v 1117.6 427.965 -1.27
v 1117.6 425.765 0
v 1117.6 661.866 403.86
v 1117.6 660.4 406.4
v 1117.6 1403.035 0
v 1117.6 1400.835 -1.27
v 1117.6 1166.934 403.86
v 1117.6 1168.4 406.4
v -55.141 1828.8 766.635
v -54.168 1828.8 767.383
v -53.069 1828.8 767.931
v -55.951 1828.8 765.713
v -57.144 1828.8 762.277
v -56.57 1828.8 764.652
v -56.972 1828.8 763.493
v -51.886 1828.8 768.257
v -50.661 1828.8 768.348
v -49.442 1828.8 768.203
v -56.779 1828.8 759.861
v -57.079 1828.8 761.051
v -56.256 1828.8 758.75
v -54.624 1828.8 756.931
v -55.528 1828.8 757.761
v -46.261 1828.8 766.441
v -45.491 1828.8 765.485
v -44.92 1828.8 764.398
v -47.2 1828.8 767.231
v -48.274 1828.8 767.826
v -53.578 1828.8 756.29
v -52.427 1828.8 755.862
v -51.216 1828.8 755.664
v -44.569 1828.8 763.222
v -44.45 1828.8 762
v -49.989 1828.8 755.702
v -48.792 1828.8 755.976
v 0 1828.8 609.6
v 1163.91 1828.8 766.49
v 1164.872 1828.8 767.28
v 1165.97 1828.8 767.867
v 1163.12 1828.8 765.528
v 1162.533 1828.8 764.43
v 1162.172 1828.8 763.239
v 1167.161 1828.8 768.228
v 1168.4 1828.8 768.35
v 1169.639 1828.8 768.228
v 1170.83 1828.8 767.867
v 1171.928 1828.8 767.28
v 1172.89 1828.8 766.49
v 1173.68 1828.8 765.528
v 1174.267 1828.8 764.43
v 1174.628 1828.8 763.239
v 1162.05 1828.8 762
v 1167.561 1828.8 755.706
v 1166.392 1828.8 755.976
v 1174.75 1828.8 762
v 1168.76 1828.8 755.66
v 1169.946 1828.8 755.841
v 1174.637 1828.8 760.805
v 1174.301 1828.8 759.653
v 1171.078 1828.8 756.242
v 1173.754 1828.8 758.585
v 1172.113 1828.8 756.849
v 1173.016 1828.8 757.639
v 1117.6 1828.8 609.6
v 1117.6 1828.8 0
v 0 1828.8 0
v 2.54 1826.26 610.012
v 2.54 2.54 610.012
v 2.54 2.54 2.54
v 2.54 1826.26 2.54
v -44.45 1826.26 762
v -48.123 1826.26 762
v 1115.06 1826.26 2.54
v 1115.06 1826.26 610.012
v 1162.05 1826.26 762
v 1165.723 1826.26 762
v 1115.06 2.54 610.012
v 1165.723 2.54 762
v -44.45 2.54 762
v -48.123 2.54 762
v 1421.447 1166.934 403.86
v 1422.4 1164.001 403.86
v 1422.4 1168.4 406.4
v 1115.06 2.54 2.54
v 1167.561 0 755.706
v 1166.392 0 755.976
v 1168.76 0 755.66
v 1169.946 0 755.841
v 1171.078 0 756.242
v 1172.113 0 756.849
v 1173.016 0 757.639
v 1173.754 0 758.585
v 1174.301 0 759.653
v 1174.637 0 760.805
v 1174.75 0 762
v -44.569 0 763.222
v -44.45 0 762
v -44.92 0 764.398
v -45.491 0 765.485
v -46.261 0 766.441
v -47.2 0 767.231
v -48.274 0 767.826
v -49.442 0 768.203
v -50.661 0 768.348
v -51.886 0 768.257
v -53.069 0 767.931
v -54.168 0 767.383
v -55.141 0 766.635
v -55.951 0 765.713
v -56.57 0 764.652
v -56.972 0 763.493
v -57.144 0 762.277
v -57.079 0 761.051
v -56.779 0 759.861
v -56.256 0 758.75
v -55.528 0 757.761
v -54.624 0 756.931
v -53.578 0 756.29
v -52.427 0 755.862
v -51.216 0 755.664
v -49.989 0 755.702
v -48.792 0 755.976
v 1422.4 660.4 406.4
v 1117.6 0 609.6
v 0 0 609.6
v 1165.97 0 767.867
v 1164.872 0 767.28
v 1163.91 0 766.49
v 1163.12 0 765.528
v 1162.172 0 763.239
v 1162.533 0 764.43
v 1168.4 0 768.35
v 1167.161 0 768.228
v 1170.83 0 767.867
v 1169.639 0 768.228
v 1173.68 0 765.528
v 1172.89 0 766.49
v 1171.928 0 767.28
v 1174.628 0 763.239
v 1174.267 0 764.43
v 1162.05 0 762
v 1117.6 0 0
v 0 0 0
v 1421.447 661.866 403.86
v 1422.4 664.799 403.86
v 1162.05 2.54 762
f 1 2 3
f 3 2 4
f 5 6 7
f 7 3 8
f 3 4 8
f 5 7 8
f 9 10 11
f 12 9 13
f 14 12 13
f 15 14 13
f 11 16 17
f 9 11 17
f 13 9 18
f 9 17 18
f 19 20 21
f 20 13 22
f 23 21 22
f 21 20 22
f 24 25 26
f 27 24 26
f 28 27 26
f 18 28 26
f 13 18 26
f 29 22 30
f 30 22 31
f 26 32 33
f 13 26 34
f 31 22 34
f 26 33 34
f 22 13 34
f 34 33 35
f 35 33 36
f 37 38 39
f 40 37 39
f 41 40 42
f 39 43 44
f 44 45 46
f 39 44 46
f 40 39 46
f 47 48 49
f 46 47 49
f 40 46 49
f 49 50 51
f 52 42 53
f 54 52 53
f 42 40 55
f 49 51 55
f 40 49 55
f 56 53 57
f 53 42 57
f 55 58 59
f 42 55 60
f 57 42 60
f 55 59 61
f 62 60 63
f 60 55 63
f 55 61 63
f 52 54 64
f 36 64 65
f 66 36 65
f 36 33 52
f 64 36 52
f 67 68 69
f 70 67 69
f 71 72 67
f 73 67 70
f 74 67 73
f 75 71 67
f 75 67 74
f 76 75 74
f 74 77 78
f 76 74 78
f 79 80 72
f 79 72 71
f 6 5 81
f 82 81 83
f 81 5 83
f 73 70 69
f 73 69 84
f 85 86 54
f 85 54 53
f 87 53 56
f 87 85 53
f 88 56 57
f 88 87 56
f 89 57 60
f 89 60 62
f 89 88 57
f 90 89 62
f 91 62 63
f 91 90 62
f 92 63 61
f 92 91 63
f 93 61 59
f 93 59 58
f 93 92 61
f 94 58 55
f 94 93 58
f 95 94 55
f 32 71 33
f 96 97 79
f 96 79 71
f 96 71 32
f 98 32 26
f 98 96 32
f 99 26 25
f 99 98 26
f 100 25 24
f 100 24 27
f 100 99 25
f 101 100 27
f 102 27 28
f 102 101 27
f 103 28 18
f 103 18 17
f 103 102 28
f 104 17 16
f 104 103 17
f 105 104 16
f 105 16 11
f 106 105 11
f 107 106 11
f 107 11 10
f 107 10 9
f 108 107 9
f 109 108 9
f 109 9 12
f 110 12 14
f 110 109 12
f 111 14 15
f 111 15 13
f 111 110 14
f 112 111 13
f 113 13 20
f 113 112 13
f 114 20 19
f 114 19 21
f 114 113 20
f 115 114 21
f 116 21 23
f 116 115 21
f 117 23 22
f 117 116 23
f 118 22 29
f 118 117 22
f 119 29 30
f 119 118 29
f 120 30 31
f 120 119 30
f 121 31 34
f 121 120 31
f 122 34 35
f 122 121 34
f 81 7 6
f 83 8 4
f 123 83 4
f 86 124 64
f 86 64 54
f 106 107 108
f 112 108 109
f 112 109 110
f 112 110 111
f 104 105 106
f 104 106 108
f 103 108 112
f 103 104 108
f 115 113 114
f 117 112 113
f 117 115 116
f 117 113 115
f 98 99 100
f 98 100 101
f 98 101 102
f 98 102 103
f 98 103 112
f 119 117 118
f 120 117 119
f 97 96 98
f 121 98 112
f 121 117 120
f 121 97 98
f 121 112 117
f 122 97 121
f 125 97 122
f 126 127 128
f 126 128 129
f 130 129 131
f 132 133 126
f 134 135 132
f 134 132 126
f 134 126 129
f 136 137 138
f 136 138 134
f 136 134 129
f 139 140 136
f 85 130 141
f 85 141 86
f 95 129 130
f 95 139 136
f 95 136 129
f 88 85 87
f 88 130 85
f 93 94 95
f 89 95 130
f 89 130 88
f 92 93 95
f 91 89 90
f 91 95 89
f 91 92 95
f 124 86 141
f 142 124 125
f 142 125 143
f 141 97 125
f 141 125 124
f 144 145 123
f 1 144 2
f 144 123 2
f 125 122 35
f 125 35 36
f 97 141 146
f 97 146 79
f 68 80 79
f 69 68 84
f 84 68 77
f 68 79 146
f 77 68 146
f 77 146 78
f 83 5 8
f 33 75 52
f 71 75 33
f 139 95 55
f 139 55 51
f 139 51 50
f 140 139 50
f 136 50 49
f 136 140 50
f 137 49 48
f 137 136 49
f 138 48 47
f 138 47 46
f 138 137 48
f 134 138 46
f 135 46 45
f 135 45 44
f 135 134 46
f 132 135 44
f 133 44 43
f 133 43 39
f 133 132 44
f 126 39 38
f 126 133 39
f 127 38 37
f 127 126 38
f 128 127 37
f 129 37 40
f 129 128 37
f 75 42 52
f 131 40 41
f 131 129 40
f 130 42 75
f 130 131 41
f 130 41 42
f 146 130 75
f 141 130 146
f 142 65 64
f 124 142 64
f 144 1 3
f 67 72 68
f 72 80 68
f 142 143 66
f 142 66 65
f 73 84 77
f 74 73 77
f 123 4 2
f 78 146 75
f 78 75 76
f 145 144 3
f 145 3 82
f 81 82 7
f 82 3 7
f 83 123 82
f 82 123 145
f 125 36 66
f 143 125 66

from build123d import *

# Parameters (mm, degrees)
F1_DEPTH  = 1828.8
F2_T      = -2.54
F6_DEPTH  = 304.8
F9_DEPTH  = 25.4
F10_DEPTH = 25.4


with BuildPart() as f1:
    # F0 (on Front) → F1 (new body)
    with BuildSketch(Plane.XZ):
        Polygon((0, 609.6), (0, 0), (1117.6, 0), (1117.6, 609.6), (1168.4, 762), (558.8, 762), (-50.8, 762), align=None)
    extrude(amount=-F1_DEPTH)

    # F2
    f2_openings = [f1.faces().sort_by_distance(p)[0] for p in [
        (558.8, 914.4, 762),
    ]]
    offset(amount=F2_T, openings=f2_openings, kind=Kind.INTERSECTION)

    # F4: sweep along a path in F4_path
    with BuildLine(Plane(origin=(-50.8, 1828.8, 762), x_dir=(0, 1, 0), z_dir=(0, 0, 1))) as f4_path:
        Line((0, 0), (-1828.8, 0))
    # F3 (on face) → F4 (sweep)
    with BuildSketch(Plane.XZ):
        with BuildLine():
            ThreePointArc((1166.3919536858, 755.9758610574), (1172.1129103076, 756.8486121241), (1174.75, 762))
            ThreePointArc((1174.75, 762), (1168.4, 768.35), (1162.05, 762))
            Line((1162.05, 762), (1168.4, 762))
            Line((1168.4, 762), (1166.3919536858, 755.9758610574))
        make_face()
        with BuildLine():
            Line((-50.8, 762), (-44.45, 762))
            ThreePointArc((-44.45, 762), (-55.9513878759, 765.7129103076), (-48.7919536858, 755.9758610574))
            Line((-48.7919536858, 755.9758610574), (-50.8, 762))
        make_face()
    sweep(path=f4_path.line)


with BuildPart() as f6:
    # F5 (on face) → F6 (new body)
    with BuildSketch(Plane.YZ.offset(1117.6)):
        Polygon((1168.4, 406.4), (914.4, 406.4), (660.4, 406.4), (425.7648506013, 0), (427.9645551269, -1.27), (661.8664696837, 403.86), (914.4, 403.86), (1166.9335303163, 403.86), (1400.8354448731, -1.27), (1403.0351493987, 0), align=None)
    extrude(amount=F6_DEPTH)

    # F8 (on face) → F9 (cut)
    with BuildSketch(Plane(origin=(0, 1052.276362049, 607.5320408909), x_dir=(-1, 0, 0), z_dir=(0, 0.8660254038, 0.5))):
        Polygon((-1117.6, -701.5175746993), (-1422.4, -232.247275902), (-1422.4, -701.5175746993), align=None)
    extrude(amount=-F9_DEPTH, mode=Mode.SUBTRACT)

    # F7 (on face) → F10 (cut)
    with BuildSketch(Plane(origin=(0, 319.323637951, -184.3615883296), x_dir=(1, 0, 0), z_dir=(0, -0.8660254038, 0.5))):
        Polygon((1422.4, 682.152724098), (1117.6, 212.8824253007), (1422.4, 212.8824253007), align=None)
    extrude(amount=-F10_DEPTH, mode=Mode.SUBTRACT)


solid = Compound([f1.part, f6.part])
